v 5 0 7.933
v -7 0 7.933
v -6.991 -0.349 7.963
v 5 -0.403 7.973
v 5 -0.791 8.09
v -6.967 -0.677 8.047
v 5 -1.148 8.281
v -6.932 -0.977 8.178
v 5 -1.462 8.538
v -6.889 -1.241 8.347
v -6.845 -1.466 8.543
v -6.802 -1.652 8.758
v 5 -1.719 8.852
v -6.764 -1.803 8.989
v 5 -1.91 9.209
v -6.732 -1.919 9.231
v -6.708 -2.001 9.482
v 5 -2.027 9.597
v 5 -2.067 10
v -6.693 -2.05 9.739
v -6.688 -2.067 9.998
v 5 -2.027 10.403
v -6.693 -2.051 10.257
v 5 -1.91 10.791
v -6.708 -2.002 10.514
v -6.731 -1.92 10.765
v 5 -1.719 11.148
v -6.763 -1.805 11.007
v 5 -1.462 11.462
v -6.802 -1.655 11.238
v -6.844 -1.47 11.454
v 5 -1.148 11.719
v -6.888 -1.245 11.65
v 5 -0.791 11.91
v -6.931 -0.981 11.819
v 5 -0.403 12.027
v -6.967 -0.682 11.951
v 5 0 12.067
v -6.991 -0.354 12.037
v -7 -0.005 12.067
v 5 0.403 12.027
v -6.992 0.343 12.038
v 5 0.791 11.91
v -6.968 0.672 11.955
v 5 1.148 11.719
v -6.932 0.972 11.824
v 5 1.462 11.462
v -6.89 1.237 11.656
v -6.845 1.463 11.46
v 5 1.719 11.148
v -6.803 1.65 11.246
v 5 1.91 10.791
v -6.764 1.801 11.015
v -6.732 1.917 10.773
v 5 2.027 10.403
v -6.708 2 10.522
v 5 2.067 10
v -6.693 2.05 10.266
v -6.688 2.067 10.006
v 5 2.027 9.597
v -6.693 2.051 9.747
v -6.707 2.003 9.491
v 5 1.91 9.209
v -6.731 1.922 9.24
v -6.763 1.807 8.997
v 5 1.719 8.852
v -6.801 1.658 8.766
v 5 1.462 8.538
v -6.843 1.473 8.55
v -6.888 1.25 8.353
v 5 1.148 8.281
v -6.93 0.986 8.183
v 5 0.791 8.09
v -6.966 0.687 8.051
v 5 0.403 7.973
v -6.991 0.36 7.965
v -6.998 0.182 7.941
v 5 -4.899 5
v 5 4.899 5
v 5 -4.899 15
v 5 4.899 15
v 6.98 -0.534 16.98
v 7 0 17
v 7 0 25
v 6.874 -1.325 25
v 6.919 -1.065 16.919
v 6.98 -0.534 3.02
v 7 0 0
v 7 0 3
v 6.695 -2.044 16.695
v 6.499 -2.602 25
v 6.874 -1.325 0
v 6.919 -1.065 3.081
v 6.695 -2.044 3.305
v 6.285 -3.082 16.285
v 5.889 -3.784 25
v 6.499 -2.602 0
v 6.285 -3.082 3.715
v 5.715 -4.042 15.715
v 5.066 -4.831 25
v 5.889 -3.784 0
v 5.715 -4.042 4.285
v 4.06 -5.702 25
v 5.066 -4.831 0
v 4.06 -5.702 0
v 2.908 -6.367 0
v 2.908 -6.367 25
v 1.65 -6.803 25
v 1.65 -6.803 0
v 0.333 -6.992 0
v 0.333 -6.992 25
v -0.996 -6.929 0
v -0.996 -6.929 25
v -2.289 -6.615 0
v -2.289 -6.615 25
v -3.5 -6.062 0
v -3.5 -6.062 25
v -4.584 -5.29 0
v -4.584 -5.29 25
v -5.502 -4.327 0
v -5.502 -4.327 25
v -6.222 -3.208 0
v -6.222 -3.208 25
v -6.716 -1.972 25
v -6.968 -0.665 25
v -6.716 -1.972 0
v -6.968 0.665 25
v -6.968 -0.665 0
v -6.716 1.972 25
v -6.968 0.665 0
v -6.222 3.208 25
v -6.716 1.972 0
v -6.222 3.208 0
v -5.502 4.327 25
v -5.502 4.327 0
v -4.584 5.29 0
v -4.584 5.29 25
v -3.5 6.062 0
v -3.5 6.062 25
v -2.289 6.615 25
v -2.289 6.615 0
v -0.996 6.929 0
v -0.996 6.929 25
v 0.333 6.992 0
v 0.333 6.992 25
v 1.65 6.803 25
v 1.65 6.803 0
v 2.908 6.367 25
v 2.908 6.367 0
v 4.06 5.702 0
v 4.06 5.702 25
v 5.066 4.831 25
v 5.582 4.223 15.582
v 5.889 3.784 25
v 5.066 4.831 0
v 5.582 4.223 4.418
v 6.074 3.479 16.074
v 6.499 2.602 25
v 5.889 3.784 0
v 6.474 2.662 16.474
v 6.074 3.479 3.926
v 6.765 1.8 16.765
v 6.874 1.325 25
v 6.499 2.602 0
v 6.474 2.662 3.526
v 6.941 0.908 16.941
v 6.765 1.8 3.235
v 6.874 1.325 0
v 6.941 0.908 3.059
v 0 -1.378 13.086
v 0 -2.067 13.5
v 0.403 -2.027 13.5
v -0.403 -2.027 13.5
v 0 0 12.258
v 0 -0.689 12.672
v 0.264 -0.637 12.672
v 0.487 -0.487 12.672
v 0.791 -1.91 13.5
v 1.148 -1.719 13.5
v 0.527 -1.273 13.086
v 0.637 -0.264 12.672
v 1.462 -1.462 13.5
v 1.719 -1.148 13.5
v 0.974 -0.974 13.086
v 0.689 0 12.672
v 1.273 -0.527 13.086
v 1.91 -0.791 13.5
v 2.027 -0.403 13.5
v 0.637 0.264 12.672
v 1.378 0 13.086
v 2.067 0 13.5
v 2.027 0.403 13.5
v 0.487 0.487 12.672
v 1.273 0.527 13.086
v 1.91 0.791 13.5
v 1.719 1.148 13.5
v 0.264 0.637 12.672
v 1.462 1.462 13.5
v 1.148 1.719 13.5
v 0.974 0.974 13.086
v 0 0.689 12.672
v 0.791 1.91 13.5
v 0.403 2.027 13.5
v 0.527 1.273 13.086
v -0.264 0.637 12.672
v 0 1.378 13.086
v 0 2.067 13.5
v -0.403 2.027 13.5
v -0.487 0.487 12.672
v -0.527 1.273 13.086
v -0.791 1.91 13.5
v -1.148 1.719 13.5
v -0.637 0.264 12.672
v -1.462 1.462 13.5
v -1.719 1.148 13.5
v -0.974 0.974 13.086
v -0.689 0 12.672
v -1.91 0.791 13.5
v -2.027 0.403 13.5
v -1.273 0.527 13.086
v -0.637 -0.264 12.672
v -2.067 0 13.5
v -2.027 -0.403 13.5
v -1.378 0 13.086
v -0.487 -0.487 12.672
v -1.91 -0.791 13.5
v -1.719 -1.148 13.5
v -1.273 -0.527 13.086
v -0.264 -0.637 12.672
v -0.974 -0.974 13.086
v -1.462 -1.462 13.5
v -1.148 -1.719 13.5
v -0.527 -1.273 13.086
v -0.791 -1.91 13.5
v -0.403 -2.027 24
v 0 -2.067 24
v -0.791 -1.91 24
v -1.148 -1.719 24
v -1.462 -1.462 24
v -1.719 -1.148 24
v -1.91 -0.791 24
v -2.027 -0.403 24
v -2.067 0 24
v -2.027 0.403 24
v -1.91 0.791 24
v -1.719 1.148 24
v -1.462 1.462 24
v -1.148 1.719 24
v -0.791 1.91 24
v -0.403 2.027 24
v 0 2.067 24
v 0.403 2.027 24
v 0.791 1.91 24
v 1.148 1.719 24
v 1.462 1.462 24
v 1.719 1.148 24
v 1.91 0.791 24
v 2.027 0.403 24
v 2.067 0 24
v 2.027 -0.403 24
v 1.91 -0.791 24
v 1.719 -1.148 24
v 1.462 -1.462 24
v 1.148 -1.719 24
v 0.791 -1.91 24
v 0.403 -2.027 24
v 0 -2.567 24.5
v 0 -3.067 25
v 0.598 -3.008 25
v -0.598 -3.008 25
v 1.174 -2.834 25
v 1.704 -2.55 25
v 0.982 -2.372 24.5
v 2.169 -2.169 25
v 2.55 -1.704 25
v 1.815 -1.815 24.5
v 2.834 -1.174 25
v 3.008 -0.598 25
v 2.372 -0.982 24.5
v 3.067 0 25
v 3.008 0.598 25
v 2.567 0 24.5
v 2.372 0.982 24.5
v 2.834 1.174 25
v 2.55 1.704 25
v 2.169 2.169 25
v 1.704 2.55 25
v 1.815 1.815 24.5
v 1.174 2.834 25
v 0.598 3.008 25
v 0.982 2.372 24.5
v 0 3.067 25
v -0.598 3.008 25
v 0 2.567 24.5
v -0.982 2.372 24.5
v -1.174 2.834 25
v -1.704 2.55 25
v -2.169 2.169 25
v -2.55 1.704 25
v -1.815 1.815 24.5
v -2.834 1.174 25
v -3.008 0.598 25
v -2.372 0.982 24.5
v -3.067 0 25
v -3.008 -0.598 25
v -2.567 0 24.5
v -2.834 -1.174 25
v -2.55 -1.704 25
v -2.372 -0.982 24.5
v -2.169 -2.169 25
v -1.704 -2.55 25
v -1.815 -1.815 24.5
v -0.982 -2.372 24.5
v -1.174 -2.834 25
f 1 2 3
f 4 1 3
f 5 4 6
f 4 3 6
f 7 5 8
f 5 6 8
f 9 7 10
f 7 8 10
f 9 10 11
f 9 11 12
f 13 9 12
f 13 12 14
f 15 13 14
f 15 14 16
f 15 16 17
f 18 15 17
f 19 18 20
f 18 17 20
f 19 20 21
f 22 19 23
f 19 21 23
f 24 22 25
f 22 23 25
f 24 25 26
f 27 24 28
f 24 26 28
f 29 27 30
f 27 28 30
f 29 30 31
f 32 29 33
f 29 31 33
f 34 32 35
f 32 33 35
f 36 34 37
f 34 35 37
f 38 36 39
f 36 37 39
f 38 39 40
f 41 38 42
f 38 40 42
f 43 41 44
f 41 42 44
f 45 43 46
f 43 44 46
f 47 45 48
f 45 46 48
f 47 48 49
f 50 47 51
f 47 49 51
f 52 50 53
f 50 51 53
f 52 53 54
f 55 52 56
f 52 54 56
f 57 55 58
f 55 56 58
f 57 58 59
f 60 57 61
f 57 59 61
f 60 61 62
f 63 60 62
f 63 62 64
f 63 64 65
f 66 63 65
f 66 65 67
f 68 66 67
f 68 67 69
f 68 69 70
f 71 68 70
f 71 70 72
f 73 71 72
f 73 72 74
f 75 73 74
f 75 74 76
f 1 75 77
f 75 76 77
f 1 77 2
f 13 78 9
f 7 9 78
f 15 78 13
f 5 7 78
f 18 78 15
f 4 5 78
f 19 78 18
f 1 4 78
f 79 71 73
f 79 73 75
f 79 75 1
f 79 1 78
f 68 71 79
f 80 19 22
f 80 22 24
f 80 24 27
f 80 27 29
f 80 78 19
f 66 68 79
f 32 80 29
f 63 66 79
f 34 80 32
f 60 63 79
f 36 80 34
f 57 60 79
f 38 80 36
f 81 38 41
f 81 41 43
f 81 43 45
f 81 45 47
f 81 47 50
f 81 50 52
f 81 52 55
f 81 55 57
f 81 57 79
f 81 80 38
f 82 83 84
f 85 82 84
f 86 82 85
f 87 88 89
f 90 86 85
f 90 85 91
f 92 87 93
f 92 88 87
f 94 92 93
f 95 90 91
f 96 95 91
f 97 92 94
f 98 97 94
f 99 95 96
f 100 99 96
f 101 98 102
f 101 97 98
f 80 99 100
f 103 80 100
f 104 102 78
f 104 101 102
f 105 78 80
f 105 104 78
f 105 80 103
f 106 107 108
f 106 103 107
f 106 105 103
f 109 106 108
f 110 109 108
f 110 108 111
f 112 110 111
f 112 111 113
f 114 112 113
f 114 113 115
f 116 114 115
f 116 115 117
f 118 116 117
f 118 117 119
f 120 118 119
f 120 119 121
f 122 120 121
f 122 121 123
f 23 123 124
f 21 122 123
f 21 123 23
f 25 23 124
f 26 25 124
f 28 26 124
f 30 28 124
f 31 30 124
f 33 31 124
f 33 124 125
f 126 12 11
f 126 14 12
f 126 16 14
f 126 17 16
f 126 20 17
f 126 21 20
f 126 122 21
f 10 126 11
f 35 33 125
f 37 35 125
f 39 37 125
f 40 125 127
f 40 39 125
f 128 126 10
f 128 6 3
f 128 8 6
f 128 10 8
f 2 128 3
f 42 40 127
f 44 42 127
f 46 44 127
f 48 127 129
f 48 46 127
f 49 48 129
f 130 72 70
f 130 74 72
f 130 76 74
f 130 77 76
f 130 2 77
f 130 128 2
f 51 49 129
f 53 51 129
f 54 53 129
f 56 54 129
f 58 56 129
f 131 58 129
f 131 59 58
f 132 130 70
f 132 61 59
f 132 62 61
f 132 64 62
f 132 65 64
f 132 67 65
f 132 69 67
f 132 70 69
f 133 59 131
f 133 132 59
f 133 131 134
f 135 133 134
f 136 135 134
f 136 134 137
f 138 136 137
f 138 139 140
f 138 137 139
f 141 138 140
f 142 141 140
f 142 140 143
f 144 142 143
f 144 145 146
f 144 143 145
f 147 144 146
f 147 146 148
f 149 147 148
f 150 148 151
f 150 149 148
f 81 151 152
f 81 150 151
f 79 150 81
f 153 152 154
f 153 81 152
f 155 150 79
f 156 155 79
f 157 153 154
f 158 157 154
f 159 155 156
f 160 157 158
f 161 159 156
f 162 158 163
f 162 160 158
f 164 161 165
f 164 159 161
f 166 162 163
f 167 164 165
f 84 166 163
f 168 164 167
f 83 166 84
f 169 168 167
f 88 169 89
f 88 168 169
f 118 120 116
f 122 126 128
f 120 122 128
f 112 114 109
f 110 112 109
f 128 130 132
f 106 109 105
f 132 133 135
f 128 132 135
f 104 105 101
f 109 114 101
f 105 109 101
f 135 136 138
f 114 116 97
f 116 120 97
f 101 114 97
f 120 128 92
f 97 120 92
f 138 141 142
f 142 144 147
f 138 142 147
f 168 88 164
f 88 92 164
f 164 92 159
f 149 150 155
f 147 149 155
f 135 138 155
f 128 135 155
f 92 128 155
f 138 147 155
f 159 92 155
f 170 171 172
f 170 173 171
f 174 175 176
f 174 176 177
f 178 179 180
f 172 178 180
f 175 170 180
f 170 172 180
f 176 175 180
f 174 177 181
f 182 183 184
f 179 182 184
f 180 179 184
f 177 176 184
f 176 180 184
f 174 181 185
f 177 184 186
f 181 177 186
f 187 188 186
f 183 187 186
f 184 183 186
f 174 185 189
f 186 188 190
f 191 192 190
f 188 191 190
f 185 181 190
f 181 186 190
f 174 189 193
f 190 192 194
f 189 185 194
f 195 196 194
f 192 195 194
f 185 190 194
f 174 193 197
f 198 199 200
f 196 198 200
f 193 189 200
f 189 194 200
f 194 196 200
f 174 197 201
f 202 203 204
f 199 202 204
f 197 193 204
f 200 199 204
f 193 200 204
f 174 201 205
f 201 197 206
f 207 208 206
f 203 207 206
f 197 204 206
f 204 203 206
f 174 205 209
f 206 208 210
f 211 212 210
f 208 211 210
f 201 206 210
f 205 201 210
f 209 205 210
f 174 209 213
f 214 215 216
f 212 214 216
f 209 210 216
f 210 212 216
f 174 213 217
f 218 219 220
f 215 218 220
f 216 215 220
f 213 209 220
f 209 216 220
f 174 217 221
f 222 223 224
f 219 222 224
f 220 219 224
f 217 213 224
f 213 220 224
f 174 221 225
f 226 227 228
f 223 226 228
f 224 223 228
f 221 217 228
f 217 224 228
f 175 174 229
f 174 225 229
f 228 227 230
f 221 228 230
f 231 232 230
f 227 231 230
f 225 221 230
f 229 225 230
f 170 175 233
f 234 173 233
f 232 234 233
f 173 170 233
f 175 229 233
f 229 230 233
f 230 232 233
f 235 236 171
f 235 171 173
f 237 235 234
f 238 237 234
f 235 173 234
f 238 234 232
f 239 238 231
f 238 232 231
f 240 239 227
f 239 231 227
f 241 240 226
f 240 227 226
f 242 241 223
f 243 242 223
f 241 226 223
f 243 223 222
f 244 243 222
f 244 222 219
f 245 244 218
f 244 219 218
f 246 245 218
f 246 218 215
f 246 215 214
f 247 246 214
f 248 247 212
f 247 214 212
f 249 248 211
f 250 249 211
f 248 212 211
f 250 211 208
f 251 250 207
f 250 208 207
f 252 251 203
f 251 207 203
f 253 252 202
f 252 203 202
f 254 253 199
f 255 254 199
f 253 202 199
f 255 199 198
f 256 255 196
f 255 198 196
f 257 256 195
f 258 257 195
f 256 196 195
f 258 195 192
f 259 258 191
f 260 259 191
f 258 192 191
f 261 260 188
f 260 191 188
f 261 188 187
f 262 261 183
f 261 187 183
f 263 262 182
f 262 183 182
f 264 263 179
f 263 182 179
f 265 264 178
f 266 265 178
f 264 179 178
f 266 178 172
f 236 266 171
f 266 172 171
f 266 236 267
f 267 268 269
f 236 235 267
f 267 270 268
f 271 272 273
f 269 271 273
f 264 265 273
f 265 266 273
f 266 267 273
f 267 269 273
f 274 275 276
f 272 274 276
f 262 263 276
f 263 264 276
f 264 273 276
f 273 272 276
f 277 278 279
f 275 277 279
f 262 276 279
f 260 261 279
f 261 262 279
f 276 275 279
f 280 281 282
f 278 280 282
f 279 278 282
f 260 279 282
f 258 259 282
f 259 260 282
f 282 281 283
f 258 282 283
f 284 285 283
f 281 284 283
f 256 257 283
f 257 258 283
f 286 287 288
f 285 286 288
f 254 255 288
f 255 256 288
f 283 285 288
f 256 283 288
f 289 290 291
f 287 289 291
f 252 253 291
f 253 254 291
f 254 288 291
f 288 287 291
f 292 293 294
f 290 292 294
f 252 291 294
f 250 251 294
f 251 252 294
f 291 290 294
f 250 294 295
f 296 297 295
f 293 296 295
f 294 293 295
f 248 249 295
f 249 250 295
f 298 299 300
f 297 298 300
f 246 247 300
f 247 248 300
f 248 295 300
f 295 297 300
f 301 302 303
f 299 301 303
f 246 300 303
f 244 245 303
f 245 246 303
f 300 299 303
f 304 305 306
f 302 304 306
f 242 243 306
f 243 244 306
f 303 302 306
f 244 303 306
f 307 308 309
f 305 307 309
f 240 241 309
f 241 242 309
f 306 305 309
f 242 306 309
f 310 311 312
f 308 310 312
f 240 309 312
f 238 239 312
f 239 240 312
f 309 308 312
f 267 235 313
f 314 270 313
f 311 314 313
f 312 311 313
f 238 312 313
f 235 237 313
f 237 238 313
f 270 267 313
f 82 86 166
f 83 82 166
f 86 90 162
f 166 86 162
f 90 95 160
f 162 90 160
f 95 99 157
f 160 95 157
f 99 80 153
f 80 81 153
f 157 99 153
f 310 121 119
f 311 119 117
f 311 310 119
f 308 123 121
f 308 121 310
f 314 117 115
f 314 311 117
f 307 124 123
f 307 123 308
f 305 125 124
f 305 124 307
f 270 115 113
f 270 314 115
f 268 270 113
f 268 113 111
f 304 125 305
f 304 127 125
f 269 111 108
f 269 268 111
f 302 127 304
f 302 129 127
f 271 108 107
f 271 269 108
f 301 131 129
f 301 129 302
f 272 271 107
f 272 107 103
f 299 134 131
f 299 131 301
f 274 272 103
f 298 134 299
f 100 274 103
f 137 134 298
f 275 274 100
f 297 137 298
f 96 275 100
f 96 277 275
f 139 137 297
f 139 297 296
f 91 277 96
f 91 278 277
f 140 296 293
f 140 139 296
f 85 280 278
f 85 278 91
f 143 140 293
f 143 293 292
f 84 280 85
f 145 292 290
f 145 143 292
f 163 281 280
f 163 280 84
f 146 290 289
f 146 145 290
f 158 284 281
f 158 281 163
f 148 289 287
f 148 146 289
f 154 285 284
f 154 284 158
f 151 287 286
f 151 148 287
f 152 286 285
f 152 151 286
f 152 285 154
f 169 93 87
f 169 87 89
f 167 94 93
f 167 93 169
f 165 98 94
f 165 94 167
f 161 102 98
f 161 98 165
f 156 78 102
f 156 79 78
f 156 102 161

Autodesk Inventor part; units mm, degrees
ref_plane "XY Plane" through (0, 0, 0) normal (0, 0, 1) x (1, 0, 0)
sketch "Skizze1" plane through (0, 0, 0) normal (0, 0, 1) x (1, 0, 0)
  circle A0 centre (0, 0) radius 7
  dimension "d0" = 14
extrude "Extrusion1" add sketch "Skizze1" along normal blind 25
sketch "Skizze2" plane through (0, 0, 25) normal (0, 0, 1) x (1, 0, 0)
  circle A0 centre (0, 0) radius 7 projected
hole "Bohrung1" at (0, 0, 25) direction (0, 0, -1) diameter 4.134 depth 11.5 tip angle 118 thread size "M5x0.8" class "6H" standard "ISO Metric profile"
chamfer "Fasen1" distance 1 angle 45 1 edges at (0, 2.067, 25)
ref_plane "Arbeitsebene1" through (-7, 0, 0) normal (1, 0, 0) x (0, 1, 0)
ref_plane "Arbeitsebene2" through (0, -7, 0) normal (0, 1, 0) x (-1, 0, 0)
ref_plane "Arbeitsebene3" through (7, 0, 0) normal (1, 0, 0) x (0, 1, 0)
sketch "Skizze6" plane through (7, 0, 0) normal (1, 0, 0) x (0, 1, 0)
  line L0 (-7, 0) -> (-7, 25) projected
  line L1 (7, 0) -> (7, 25) projected
  line L2 (-7, 5) -> (7, 5)
  line L3 (7, 5) -> (7, 15)
  line L4 (7, 15) -> (-7, 15)
  line L5 (-7, 15) -> (-7, 5)
  line L6 (7, 25) -> (-7, 25) projected
  point P0 (0, 0)
  point P1 (-7, 15)
  point P2 (7, 5)
  dimension "d29" = 10
  dimension "d30" = 10
extrude "Extrusion4" cut sketch "Skizze6" against normal blind 2 contours L0 L4 L1 L2
sketch "Skizze7" plane through (5, 0, 0) normal (1, 0, 0) x (0, 0, -1)
  line L0 (-5, -4.899) -> (-5, 4.899) projected
  line L1 (0, 7) -> (0, -7) projected
  point P0 (0, 0)
  point P1 (-10, 0)
  point P2 (0, 0)
  point P3 (0, 0)
  point P4 (0, 0)
  dimension "d33" = 5
hole "Bohrung3" at (5, 0, 10) direction (-1, 0, 0) diameter 4.134 end through all thread size "M5x0.8" class "6H" standard "ISO Metric profile"
ref_plane "Arbeitsebene4" through (0, 7, 0) normal (0, 1, 0) x (-1, 0, 0)
sketch "Skizze8" plane through (0, 7, 0) normal (0, 1, 0) x (-1, 0, 0)
  line L0 (-5, 5) -> (-5, 5) projected
  line L1 (-5, 7.933) -> (-5, 12.067) projected
  line L2 (-5, 5) -> (-5, 15) projected
  line L3 (-5, 15) -> (-5, 5) projected
  line L4 (-5, 15) -> (-7, 15) projected
  line L5 (-5, 15) -> (-5, 5) projected
  line L6 (-5, 5) -> (-5, 15) projected
  line L7 (-5, 15) -> (-5, 15) projected
  line L8 (-7, 5) -> (-5, 5) projected
  line L9 (-5, 5) -> (-7, 3)
  line L10 (-7, 0) -> (-7, 25) projected
  line L11 (-5, 5) -> (-2.1716, 5) construction
  line L12 (-7, 3) -> (-7, 5)
  line L13 (-5, 15) -> (-7, 17)
  line L14 (-5, 15) -> (-2.1716, 15) construction
  line L15 (-7, 17) -> (-7, 15)
  point P0 (0, 0)
  point P1 (-5, 24.433)
  point P2 (-5, 28.567)
  dimension "d42" = 135
  dimension "d43" = 135
extrude "Extrusion5" cut sketch "Skizze8" against normal through all contours L9 L10 L8 | L4 L10 L13
properties part number "TS_V1_Fallmagazin_Schieberanbindung_int"
